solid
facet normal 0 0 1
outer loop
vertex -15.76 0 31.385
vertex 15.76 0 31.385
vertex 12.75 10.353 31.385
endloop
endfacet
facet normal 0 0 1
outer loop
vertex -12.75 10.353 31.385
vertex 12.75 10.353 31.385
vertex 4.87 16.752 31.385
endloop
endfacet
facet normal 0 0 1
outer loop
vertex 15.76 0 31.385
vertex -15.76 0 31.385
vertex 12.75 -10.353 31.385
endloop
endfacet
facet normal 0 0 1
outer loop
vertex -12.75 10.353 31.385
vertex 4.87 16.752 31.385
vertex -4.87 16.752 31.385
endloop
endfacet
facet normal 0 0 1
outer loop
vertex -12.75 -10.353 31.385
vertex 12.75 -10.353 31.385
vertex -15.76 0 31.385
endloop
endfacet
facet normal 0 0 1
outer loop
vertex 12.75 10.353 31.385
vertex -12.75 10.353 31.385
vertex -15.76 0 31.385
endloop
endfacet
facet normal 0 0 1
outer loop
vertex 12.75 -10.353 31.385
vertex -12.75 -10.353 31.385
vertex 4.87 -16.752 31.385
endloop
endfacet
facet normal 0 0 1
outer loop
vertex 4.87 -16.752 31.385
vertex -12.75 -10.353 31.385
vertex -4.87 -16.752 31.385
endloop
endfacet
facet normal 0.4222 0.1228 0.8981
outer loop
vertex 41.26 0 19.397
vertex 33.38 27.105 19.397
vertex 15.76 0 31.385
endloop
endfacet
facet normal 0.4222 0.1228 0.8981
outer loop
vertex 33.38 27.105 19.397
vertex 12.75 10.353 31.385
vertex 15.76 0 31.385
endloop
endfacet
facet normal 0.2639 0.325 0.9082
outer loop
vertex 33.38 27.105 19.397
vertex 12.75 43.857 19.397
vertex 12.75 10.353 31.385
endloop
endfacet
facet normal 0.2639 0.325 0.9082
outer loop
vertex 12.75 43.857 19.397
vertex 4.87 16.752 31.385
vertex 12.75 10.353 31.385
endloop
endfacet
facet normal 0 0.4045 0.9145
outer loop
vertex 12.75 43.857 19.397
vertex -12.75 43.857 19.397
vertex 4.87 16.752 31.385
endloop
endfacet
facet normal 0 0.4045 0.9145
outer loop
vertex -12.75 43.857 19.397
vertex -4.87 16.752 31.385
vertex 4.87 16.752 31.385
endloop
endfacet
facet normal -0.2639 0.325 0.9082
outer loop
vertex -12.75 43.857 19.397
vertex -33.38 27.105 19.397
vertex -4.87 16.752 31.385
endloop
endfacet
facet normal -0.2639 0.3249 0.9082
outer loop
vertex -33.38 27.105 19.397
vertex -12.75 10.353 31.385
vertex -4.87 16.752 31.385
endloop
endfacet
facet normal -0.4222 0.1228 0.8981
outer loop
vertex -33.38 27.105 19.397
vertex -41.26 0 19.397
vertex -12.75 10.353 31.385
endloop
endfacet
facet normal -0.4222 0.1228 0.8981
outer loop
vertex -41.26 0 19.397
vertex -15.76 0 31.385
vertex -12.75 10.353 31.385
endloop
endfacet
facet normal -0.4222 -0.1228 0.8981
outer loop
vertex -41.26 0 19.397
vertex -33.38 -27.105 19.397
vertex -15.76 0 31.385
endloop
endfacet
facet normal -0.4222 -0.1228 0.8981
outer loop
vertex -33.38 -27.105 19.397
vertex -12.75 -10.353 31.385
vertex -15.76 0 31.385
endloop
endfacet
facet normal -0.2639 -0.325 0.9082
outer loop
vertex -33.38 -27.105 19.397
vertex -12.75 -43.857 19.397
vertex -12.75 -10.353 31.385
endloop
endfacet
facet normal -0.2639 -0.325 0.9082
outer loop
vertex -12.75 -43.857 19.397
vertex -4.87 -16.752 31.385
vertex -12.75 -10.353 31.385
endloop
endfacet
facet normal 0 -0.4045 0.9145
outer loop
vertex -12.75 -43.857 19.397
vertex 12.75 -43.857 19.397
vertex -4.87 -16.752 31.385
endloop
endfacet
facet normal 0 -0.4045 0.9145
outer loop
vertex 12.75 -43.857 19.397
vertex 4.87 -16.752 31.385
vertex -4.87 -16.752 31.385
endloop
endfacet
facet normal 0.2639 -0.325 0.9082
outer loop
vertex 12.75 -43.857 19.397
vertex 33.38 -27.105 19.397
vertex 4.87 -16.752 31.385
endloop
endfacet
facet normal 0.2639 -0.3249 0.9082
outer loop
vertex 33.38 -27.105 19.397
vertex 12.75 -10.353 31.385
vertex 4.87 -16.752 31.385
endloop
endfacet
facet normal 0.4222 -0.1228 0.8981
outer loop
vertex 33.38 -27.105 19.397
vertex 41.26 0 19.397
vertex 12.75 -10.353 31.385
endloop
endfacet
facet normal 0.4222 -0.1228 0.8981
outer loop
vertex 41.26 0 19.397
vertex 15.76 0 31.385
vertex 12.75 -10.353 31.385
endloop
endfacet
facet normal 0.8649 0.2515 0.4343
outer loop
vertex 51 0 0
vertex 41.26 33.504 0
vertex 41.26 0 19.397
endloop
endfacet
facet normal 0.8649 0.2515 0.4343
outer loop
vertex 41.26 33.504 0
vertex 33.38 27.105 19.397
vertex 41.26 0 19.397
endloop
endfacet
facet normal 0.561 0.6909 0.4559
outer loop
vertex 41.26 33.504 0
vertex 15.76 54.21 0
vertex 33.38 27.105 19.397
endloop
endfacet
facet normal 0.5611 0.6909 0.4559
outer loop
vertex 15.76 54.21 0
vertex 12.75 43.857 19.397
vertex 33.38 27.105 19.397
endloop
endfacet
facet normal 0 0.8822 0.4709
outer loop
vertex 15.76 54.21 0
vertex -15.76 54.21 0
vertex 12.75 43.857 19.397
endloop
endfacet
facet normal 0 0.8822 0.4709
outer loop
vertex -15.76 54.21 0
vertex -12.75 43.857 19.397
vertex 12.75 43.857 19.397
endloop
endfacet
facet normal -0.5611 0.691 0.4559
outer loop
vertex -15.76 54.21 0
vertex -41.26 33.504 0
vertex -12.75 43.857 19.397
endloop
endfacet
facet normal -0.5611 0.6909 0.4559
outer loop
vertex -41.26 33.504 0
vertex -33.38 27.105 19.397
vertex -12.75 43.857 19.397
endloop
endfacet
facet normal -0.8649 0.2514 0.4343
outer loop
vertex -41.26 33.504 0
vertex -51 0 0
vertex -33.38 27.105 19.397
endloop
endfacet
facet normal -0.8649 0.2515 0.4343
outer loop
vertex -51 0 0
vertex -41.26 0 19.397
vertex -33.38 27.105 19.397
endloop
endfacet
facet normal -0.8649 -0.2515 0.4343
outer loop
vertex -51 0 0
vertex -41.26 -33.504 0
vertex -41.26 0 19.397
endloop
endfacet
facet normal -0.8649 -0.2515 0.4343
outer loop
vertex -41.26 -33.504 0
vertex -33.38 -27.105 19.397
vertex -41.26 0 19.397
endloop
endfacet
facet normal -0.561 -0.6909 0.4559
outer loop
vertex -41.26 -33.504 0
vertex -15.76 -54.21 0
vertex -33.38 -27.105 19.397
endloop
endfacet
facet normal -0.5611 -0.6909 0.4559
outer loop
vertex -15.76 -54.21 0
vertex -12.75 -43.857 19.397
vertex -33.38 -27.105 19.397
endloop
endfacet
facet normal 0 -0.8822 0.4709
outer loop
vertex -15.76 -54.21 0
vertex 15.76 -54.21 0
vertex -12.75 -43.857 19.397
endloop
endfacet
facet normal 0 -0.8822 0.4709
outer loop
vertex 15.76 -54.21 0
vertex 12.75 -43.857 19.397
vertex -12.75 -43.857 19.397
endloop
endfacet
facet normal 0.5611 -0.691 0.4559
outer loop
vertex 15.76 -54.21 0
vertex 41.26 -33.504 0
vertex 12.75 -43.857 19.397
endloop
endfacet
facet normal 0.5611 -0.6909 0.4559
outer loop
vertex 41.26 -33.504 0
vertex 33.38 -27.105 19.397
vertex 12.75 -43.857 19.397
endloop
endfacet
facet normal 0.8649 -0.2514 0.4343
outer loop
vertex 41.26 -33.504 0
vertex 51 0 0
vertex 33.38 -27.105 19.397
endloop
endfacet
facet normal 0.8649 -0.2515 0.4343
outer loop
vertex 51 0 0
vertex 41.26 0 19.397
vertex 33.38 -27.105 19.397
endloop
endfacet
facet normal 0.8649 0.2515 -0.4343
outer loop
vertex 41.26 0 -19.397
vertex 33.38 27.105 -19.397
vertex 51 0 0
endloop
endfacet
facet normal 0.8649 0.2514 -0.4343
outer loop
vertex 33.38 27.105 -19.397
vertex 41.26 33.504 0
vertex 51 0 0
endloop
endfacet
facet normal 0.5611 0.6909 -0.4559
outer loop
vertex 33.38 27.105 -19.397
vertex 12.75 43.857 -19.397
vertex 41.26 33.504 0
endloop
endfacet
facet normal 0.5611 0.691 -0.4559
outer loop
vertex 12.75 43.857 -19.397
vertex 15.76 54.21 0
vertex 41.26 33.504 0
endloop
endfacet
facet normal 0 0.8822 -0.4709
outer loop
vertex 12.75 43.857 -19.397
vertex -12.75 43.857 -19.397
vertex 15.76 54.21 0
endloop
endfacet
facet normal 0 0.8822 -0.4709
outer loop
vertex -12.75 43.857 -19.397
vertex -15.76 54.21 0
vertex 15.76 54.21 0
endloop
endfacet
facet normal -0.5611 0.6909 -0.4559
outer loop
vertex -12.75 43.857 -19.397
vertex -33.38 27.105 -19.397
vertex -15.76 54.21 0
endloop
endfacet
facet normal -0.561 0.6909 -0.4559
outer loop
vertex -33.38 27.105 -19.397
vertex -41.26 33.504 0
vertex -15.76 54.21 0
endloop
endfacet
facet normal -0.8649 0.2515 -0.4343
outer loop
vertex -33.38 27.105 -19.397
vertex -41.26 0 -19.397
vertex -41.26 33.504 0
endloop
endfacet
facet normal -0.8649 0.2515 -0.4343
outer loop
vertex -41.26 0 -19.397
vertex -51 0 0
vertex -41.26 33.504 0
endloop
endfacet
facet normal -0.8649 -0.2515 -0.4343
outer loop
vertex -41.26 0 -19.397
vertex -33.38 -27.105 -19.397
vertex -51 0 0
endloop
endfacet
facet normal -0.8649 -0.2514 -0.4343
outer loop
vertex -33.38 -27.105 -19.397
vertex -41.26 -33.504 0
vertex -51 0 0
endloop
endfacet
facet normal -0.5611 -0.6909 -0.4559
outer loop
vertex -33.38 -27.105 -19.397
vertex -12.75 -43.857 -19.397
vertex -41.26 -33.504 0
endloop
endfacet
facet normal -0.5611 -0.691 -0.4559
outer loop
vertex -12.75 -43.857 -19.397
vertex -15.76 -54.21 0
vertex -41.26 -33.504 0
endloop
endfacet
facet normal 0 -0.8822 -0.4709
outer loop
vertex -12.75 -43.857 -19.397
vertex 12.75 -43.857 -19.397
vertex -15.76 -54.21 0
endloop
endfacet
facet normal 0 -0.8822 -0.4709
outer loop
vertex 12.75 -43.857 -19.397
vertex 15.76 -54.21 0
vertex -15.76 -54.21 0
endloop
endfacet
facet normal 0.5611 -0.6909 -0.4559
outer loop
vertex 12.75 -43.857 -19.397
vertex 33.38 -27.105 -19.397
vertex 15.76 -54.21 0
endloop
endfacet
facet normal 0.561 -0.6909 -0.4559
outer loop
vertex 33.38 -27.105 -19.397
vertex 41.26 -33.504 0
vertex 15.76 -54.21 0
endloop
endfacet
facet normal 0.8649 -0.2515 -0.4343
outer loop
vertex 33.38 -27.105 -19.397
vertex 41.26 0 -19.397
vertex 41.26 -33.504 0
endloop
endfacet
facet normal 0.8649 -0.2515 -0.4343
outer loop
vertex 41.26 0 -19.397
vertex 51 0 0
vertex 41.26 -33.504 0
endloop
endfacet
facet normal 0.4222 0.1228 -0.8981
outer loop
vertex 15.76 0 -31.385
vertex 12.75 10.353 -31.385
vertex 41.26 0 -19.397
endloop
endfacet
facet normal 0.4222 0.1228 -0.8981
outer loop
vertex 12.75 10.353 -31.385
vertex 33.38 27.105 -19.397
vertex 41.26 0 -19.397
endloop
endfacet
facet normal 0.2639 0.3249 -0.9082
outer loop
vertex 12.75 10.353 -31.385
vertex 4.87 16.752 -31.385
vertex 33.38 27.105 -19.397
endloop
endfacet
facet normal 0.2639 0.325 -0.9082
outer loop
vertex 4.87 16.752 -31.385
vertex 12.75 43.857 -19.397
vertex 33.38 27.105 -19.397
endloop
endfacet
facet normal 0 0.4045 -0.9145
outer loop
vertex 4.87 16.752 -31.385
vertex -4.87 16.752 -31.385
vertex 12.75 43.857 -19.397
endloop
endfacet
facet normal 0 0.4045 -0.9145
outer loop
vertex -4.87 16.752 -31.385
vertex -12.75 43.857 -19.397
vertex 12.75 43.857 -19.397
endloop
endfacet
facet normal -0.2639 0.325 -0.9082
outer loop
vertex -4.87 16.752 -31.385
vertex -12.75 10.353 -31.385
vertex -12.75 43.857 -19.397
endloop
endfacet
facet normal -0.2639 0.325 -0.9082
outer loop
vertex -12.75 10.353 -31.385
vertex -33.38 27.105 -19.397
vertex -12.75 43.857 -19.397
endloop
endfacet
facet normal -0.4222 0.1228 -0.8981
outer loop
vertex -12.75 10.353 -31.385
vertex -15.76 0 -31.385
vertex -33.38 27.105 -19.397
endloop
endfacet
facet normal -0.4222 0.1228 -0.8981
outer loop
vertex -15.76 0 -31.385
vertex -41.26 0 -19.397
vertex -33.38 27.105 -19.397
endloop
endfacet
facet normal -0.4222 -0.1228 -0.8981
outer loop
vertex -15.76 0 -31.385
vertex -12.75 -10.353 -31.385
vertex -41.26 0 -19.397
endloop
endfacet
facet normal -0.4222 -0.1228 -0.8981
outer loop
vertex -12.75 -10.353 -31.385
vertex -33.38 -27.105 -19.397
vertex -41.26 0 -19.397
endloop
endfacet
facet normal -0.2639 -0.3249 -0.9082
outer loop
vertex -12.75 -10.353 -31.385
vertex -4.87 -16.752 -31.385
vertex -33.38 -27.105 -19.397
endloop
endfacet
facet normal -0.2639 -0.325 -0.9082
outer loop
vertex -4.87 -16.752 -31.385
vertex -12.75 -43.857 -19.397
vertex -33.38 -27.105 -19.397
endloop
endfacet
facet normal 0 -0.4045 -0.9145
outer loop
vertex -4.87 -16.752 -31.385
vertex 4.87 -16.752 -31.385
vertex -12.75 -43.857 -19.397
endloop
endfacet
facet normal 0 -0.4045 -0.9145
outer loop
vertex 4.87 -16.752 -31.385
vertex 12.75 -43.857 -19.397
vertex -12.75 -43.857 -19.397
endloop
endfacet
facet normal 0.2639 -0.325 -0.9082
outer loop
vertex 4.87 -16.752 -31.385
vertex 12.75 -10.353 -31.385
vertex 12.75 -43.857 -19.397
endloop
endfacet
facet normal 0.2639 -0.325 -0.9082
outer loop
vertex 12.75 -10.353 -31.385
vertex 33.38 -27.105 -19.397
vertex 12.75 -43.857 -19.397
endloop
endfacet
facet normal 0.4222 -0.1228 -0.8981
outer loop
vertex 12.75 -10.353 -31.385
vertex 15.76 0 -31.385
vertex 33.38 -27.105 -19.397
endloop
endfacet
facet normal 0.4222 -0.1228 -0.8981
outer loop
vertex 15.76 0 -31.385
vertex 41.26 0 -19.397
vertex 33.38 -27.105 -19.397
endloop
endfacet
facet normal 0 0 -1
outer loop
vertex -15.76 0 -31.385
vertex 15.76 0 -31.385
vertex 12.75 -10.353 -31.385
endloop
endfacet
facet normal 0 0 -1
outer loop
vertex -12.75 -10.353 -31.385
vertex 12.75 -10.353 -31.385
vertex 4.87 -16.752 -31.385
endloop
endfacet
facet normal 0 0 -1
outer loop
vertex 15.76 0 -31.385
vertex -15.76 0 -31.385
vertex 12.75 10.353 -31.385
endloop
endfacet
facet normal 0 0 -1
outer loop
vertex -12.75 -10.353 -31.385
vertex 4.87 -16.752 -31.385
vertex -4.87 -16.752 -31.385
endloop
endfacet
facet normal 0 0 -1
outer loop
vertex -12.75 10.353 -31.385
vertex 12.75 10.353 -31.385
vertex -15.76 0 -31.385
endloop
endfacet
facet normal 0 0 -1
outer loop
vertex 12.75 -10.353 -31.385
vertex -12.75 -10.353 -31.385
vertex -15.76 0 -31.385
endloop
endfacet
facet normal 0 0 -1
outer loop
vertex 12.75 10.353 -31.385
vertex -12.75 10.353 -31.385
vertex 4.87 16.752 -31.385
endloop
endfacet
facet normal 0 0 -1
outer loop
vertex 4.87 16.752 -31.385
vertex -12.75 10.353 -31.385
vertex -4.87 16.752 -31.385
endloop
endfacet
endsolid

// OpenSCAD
// Generated by SolidPython 1.0.1 on 2020-07-29 00:46:53


scale(v = [17, 19, 11]) {
	sphere(r = 3);
}
/***********************************************
*********      SolidPython code:      **********
************************************************
 
# import packages: SolidPython
from solid import *
from solid.utils import *
from itertools import chain, combinations, permutations


class Resize:

    def __init__(self, scad_file):
        self.scad_file = scad_file
        #self.scad_file = import_scad(scad_file)
        # cone/cylinder param:
        self.r1 = 0
        self.r2 = 0
        self.h = 0
        # rectangular prism param:
        self.w = 0
        self.l = 0
        # ellipse param:
        self.r = 0

    # import OpenScad code (file name corresponds to shape)


    # classify shape + parameters
    def assign(self, param1, param2, param3):
        if self.scad_file == 'cone.scad':
            self.r1 = param1
            self.r2 = param2
            self.h = param3
        elif self.scad_file == 'cylinder.scad':
            self.r1 = param1
            self.r2 = param2
            self.h = param3
        elif self.scad_file == 'rectangularPrism.scad':
            self.h = param1
            self.l = param2
            self.w = param3
        else:
            self.r = param1
            self.h = param2

    # resize parameters
    def iterate(self):
        x = range(3, 20, 2)
        i = 1
        if self.scad_file == 'cone.scad':
            tempList = list(permutations(x, 2))
            for temp in tempList:
                param1 = temp[0]
                param2 = temp[1]
                filepath = 'produced_scad_files/' + 'cone' + str(param1) + '_' + str(param2) + '_' + '.scad'
                scad_render_to_file(cylinder(h=param1, r1=param2, r2=0), filepath)

        elif self.scad_file == 'cylinder.scad':
            tempList = list(permutations(x, 3))
            for temp in tempList:
                param1 = temp[0]
                param2 = temp[1]
                filepath = 'produced_scad_files/' + 'cylinder' + str(param1) + '_' + str(param2) + '_' + '.scad'
                scad_render_to_file(cylinder(h=param1, r1=param2, r2=param2), filepath)

        elif self.scad_file == 'rectangularPrism.scad':
            tempList = list(permutations(x, 3))
            for temp in tempList:
                param1 = temp[0]
                param2 = temp[1]
                param3 = temp[2]
                filepath = 'produced_scad_files/' + 'rectangularPrism' + str(param1) + '_' + str(param2) + '_' + str(
                    param3) + '.scad'
                scad_render_to_file(cube(size=(param1, param2, param3)), filepath)

        elif self.scad_file == 'ellipse.scad':
            tempList = list(permutations(x, 4))
            for temp in tempList:
                param1 = temp[0]
                param2 = temp[1]
                param3 = temp[2]
                param4 = temp[3]
                filepath = 'produced_scad_files/' + 'ellipse' + str(param1) + '_' + str(param2) + '_' + str(param3) + '_' + str(param4) + '.scad'
                scad_render_to_file(scale([param1, param2, param3])(sphere(r=param4)), filepath)

    def render_to_scadfile(self):
        scad_render_to_file(scad, 'example.scad') 
 
************************************************/
